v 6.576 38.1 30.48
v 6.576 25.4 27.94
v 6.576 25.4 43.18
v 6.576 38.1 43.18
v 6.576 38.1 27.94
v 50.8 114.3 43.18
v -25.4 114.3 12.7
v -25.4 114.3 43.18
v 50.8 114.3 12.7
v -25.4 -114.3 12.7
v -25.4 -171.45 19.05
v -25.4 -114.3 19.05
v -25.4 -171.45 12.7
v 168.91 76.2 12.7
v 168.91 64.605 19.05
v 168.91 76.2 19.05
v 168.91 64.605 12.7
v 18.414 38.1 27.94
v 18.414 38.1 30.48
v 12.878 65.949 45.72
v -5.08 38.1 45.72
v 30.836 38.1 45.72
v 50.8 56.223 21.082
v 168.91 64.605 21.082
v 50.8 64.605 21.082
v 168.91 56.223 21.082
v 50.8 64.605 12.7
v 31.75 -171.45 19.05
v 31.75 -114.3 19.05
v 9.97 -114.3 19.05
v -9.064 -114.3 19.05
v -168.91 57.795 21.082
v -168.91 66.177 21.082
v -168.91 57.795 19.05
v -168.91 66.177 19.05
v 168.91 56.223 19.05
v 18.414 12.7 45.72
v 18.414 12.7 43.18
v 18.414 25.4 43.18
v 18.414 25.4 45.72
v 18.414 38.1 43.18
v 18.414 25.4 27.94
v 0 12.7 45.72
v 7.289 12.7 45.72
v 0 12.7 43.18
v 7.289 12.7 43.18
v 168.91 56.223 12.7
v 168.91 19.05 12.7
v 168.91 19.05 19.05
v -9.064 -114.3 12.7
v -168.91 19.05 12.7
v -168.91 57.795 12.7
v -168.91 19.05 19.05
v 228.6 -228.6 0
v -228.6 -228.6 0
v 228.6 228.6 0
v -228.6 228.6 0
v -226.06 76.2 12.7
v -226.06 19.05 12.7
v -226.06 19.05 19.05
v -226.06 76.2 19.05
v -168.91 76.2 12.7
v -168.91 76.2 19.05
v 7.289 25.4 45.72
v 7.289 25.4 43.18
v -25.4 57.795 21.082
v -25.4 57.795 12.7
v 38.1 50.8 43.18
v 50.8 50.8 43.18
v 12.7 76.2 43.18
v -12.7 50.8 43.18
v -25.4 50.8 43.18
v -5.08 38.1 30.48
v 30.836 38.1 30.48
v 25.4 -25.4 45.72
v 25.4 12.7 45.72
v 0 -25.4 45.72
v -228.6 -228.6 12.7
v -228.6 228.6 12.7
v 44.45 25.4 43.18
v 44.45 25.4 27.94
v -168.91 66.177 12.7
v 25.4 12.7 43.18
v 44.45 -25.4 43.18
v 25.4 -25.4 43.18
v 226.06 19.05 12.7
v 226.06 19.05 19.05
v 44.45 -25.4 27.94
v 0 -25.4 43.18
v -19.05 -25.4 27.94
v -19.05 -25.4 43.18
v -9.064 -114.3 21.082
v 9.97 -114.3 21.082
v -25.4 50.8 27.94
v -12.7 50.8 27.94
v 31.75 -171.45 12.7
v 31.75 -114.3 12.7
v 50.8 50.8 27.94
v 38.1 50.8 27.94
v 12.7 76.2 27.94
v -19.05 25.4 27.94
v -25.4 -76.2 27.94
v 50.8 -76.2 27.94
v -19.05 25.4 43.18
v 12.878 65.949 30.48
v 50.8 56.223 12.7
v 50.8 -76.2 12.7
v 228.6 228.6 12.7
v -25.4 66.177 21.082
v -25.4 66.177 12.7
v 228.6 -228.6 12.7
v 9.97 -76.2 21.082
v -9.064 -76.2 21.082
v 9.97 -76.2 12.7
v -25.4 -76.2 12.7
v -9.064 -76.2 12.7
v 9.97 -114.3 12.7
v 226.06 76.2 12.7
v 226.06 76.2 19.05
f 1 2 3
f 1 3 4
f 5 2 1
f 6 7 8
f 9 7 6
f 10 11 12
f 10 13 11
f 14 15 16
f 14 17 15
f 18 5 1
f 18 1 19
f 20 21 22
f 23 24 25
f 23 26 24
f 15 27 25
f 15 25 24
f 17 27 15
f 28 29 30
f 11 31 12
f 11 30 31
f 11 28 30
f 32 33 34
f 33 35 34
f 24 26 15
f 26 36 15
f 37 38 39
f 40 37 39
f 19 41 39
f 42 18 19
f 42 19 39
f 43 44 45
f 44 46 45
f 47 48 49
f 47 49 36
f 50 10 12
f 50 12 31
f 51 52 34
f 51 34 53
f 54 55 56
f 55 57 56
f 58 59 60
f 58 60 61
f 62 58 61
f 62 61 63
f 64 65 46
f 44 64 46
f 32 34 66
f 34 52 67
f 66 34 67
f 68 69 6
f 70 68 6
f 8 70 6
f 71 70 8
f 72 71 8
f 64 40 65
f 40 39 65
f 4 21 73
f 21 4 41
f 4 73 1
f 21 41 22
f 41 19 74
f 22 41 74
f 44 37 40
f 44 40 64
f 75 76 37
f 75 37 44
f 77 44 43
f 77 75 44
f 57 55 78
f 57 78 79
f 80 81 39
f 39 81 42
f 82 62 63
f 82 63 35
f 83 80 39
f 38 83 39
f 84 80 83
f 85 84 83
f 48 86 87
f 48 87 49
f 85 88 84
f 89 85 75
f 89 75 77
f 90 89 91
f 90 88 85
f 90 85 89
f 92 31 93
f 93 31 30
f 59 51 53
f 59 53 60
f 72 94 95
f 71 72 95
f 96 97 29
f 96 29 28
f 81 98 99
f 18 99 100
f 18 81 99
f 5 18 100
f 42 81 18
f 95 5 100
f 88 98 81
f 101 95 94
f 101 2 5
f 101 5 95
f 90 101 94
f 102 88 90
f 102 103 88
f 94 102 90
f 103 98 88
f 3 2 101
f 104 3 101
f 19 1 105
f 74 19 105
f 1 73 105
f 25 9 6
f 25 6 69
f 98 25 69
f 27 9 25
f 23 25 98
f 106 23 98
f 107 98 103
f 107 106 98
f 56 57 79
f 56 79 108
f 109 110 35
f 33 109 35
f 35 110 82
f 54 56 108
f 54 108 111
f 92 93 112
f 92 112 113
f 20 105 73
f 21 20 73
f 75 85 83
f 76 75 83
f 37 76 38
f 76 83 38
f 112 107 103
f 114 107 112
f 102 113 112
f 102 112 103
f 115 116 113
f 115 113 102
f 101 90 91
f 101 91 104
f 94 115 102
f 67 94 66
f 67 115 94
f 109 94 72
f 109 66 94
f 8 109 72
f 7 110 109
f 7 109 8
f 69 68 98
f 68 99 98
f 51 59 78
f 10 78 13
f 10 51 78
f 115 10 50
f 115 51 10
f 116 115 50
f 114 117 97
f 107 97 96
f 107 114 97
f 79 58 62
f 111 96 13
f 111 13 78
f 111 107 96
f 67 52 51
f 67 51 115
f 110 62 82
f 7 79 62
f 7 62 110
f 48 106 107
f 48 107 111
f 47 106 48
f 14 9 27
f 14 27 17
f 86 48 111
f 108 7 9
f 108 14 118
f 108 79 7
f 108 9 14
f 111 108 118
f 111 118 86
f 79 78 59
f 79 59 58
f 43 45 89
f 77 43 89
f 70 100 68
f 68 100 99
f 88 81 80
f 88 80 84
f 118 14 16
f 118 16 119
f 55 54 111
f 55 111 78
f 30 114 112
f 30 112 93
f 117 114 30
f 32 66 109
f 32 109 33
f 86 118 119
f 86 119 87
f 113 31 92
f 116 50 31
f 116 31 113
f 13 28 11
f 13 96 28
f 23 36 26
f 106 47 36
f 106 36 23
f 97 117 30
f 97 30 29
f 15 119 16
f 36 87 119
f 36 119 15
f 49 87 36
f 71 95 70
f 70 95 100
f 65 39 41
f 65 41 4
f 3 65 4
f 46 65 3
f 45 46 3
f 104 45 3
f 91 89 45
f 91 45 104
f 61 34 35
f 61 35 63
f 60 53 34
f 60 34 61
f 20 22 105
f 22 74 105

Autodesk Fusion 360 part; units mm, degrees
sketch "base plate" plane through (0, 0, 0) normal (0, 0, 1) x (1, 0, 0)
  line L0 (-228.6, 228.6) -> (228.6, 228.6)
  line L1 (228.6, 228.6) -> (228.6, -228.6)
  line L2 (228.6, -228.6) -> (-228.6, -228.6)
  line L3 (-228.6, -228.6) -> (-228.6, 228.6)
  line L4 (-228.6, 228.6) -> (228.6, -228.6) construction
  line L5 (228.6, 228.6) -> (-228.6, -228.6) construction
  dimension "d1" = 457.2
  dimension "d2" = 457.2
extrude "Extrude1" add sketch "base plate" along normal blind 12.7 makes body 1
sketch "cylinder components" plane through (0, 0, 12.7) normal (0, 0, 1) x (-1, 0, 0)
  line L0 (228.6, 228.6) -> (-228.6, 228.6)
  line L1 (-228.6, 228.6) -> (-228.6, -228.6)
  line L2 (-228.6, -228.6) -> (228.6, -228.6)
  line L3 (228.6, -228.6) -> (228.6, 228.6)
  line L4 (25.4, -114.3) -> (-50.8, -114.3)
  line L5 (-50.8, -114.3) -> (-50.8, 76.2)
  line L6 (-50.8, 76.2) -> (25.4, 76.2)
  line L7 (25.4, 76.2) -> (25.4, -114.3)
  line L8 (-168.91, -76.2) -> (-226.06, -76.2)
  line L9 (-226.06, -76.2) -> (-226.06, -19.05)
  line L10 (-226.06, -19.05) -> (-168.91, -19.05)
  line L11 (-168.91, -19.05) -> (-168.91, -76.2)
  line L12 (0, -254) -> (0, 228.6) construction
  line L13 (25.4, 114.3) -> (-31.75, 114.3)
  line L14 (-31.75, 114.3) -> (-31.75, 171.45)
  line L15 (-31.75, 171.45) -> (25.4, 171.45)
  line L16 (25.4, 171.45) -> (25.4, 114.3)
  line L17 (-50.8, -64.605) -> (-168.91, -64.605)
  line L18 (-168.91, -64.605) -> (-168.91, -56.223)
  line L19 (-168.91, -56.223) -> (-50.8, -56.223)
  line L20 (-50.8, -56.223) -> (-50.8, -64.605)
  line L21 (226.06, -76.2) -> (168.91, -76.2)
  line L22 (168.91, -76.2) -> (168.91, -19.05)
  line L23 (168.91, -19.05) -> (226.06, -19.05)
  line L24 (226.06, -19.05) -> (226.06, -76.2)
  line L25 (25.4, -66.1774) -> (168.91, -66.1774)
  line L26 (168.91, -66.1774) -> (168.91, -57.7954)
  line L27 (168.91, -57.7954) -> (25.4, -57.7954)
  line L28 (25.4, -57.7954) -> (25.4, -66.1774)
  line L29 (9.064, 76.2) -> (-9.97, 76.2)
  line L30 (-9.97, 76.2) -> (-9.97, 114.3)
  line L31 (-9.97, 114.3) -> (9.064, 114.3)
  line L32 (9.064, 114.3) -> (9.064, 76.2)
  dimension "d5" = 76.2
  dimension "d6" = 190.5
  dimension "d9" = 57.15
  dimension "d10" = 57.15
  dimension "d13" = 2.54
  dimension "d14" = 247.65
  dimension "d22" = 57.15
  dimension "d23" = 57.15
  dimension "d24" = 38.1
  dimension "d25" = 57.15
  dimension "d26" = 196.85
  dimension "d29" = 8.382
  dimension "d30" = 118.11
  dimension "d31" = 57.15
  dimension "d32" = 57.15
  dimension "d33" = 247.65
  dimension "d34" = 2.54
  dimension "d35" = 8.382
extrude "Extrude3" add sketch "cylinder components" along normal blind 15.24 contours L4 L5 L6 L7 L20 L28 L29 bodies 1
sketch "clip retention" plane through (0, 0, 27.94) normal (0, 0, 1) x (-1, 0, 0)
  line L0 (25.4, -114.3) -> (25.4, 76.2)
  line L1 (25.4, 76.2) -> (-50.8, 76.2)
  line L2 (-50.8, 76.2) -> (-50.8, -114.3)
  line L3 (-50.8, -114.3) -> (25.4, -114.3)
  line L4 (25.4, -50.8) -> (12.7, -50.8)
  line L5 (12.7, -50.8) -> (-12.7, -76.2)
  line L6 (-12.7, -76.2) -> (-38.1, -50.8)
  line L7 (-38.1, -50.8) -> (-50.8, -50.8)
  line L8 (-50.8, -114.3) -> (25.4, -114.3)
  line L9 (25.4, -50.8) -> (25.4, -114.3)
  line L10 (19.05, -25.4) -> (-44.45, -25.4)
  line L11 (-44.45, -25.4) -> (-44.45, 25.4)
  line L12 (-44.45, 25.4) -> (19.05, 25.4)
  line L13 (19.05, 25.4) -> (19.05, -25.4)
  line L14 (-50.8, -50.8) -> (-50.8, -52.9164)
  line L15 (-50.8, -50.8) -> (-50.8, -114.3)
  point P0 (-12.7, -76.2)
  point P1 (-50.8, -114.3)
  point P2 (25.4, -114.3)
  dimension "d41" = 50.8
  dimension "d42" = 6.35
  dimension "d43" = 6.35
  dimension "d44" = 50.8
extrude "Extrude4" add sketch "cylinder components" along normal blind 6.35 contours L21 L22 L23 L24 L26 | L8 L9 L10 L11 L18 | L13 L14 L15 L16 L31 bodies 1
extrude "Extrude5" add sketch "cylinder components" along normal blind 8.382 contours L7 L22 L25 L26 L27 L28 | L5 L11 L17 L18 L19 L20 | L6 L13 L29 L30 L31 L32 bodies 1
extrude "Extrude6" add sketch "clip retention" along normal blind 15.24 contours L0 L2 L3 L4 L5 L6 L7 L8 L9 L14 L15 | L10 L11 L12 L13 bodies 1
sketch "clip hammer post cut out" plane through (0, 0, 43.18) normal (0, 0, 1) x (-1, 0, 0)
  line L0 (19.05, 25.4) -> (-44.45, 25.4)
  line L1 (-44.45, 25.4) -> (-44.45, -25.4)
  line L2 (-44.45, -25.4) -> (19.05, -25.4)
  line L3 (19.05, -25.4) -> (19.05, 25.4)
  line L4 (0, -12.7) -> (-25.4, -12.7)
  line L5 (-25.4, -12.7) -> (-25.4, 25.4)
  line L6 (-25.4, 25.4) -> (0, 25.4)
  line L7 (0, 25.4) -> (0, -12.7)
  line L8 (-7.2894, -38.3626) -> (-18.4141, -38.3626)
  line L9 (-18.4141, -38.3626) -> (-18.4141, -12.7)
  line L10 (-18.4141, -12.7) -> (-7.2894, -12.7)
  line L11 (-7.2894, -12.7) -> (-7.2894, -38.3626)
  dimension "d47" = 38.1
extrude "Extrude7" cut sketch "clip hammer post cut out" against normal blind 12.7 contours L0 L4 L5 L6 L7 L10 | L2 L8 L9 L11 | L2 L4 L9 L10 L11 bodies 1
sketch "clip hammer post" plane through (0, 0, 30.48) normal (0, 0, 1) x (-1, 0, 0)
  line L0 (-18.4141, -25.4) -> (-7.2894, -25.4)
  line L1 (-7.2894, -25.4) -> (-7.2894, -12.7)
  line L2 (-7.2894, -12.7) -> (0, -12.7)
  line L3 (0, -12.7) -> (0, 25.4)
  line L4 (0, 25.4) -> (-25.4, 25.4)
  line L5 (-25.4, 25.4) -> (-25.4, -12.7)
  line L6 (-25.4, -12.7) -> (-18.4141, -12.7)
  line L7 (-18.4141, -12.7) -> (-18.4141, -25.4)
  line L8 (-7.2894, -25.4) -> (-7.2894, -12.7)
  line L9 (0, -12.7) -> (0, 25.4)
  line L10 (-25.4, 25.4) -> (-25.4, -12.7)
  line L11 (-18.4141, -12.7) -> (-18.4141, -25.4)
  line L12 (-7.2894, -25.4) -> (-18.4141, -25.4)
  line L13 (0, 25.4) -> (-25.4, 25.4)
extrude "Extrude8" add sketch "clip hammer post" along normal blind 15.24 bodies 1
sketch "clip hammer" plane through (0, 0, 30.48) normal (0, 0, 1) x (1, 0, 0)
  line L0 (-5.08, 38.1) -> (30.8356, 38.1)
  line L1 (30.8356, 38.1) -> (12.8778, 65.9493)
  line L2 (12.8778, 65.9493) -> (-5.08, 38.1)
  dimension "d54" = 35.9156
extrude "Extrude9" add sketch "clip hammer" along normal blind 15.24 separate body makes body 2
sketch "Sketch7" plane through (0, 0, 27.94) normal (0, 0, 1) x (-1, 0, 0)
  line L0 (-50.8, -50.8) -> (-38.1, -50.8)
  line L1 (-38.1, -50.8) -> (-12.7, -76.2)
  line L2 (-12.7, -76.2) -> (12.7, -50.8)
  line L3 (12.7, -50.8) -> (25.4, -50.8)
  line L4 (25.4, -50.8) -> (25.4, 76.2)
  line L5 (25.4, 76.2) -> (-50.8, 76.2)
  line L6 (-50.8, 76.2) -> (-50.8, -50.8)
  line L7 (19.05, 25.4) -> (19.05, -25.4)
  line L8 (19.05, -25.4) -> (-44.45, -25.4)
  line L9 (-44.45, -25.4) -> (-44.45, 25.4)
  line L10 (-44.45, 25.4) -> (19.05, 25.4)
  line L11 (-6.5765, -38.1) -> (-18.4141, -38.1)
  line L12 (-18.4141, -38.1) -> (-18.4141, -25.4)
  line L13 (-18.4141, -25.4) -> (-6.5765, -25.4)
  line L14 (-6.5765, -25.4) -> (-6.5765, -38.1)
  line L15 (5.08, -38.1) -> (-30.8356, -38.1)
  point P0 (-18.4141, -25.4)
extrude "Extrude10" add sketch "Sketch7" along normal blind 15.24 contours L8 L11 L12 L13 L14 L15 bodies 1 2
